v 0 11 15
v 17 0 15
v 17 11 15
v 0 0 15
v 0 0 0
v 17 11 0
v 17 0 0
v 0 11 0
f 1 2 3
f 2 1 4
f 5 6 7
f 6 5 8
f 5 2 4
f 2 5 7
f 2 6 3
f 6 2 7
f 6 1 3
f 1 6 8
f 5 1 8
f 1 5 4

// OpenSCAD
// Generated by SolidPython 1.0.1 on 2020-07-29 00:46:56


cube(size = [17, 11, 15]);
/***********************************************
*********      SolidPython code:      **********
************************************************
 
# import packages: SolidPython
from solid import *
from solid.utils import *
from itertools import chain, combinations, permutations


class Resize:

    def __init__(self, scad_file):
        self.scad_file = scad_file
        #self.scad_file = import_scad(scad_file)
        # cone/cylinder param:
        self.r1 = 0
        self.r2 = 0
        self.h = 0
        # rectangular prism param:
        self.w = 0
        self.l = 0
        # ellipse param:
        self.r = 0

    # import OpenScad code (file name corresponds to shape)


    # classify shape + parameters
    def assign(self, param1, param2, param3):
        if self.scad_file == 'cone.scad':
            self.r1 = param1
            self.r2 = param2
            self.h = param3
        elif self.scad_file == 'cylinder.scad':
            self.r1 = param1
            self.r2 = param2
            self.h = param3
        elif self.scad_file == 'rectangularPrism.scad':
            self.h = param1
            self.l = param2
            self.w = param3
        else:
            self.r = param1
            self.h = param2

    # resize parameters
    def iterate(self):
        x = range(3, 20, 2)
        i = 1
        if self.scad_file == 'cone.scad':
            tempList = list(permutations(x, 2))
            for temp in tempList:
                param1 = temp[0]
                param2 = temp[1]
                filepath = 'produced_scad_files/' + 'cone' + str(param1) + '_' + str(param2) + '_' + '.scad'
                scad_render_to_file(cylinder(h=param1, r1=param2, r2=0), filepath)

        elif self.scad_file == 'cylinder.scad':
            tempList = list(permutations(x, 3))
            for temp in tempList:
                param1 = temp[0]
                param2 = temp[1]
                filepath = 'produced_scad_files/' + 'cylinder' + str(param1) + '_' + str(param2) + '_' + '.scad'
                scad_render_to_file(cylinder(h=param1, r1=param2, r2=param2), filepath)

        elif self.scad_file == 'rectangularPrism.scad':
            tempList = list(permutations(x, 3))
            for temp in tempList:
                param1 = temp[0]
                param2 = temp[1]
                param3 = temp[2]
                filepath = 'produced_scad_files/' + 'rectangularPrism' + str(param1) + '_' + str(param2) + '_' + str(
                    param3) + '.scad'
                scad_render_to_file(cube(size=(param1, param2, param3)), filepath)

        elif self.scad_file == 'ellipse.scad':
            tempList = list(permutations(x, 4))
            for temp in tempList:
                param1 = temp[0]
                param2 = temp[1]
                param3 = temp[2]
                param4 = temp[3]
                filepath = 'produced_scad_files/' + 'ellipse' + str(param1) + '_' + str(param2) + '_' + str(param3) + '_' + str(param4) + '.scad'
                scad_render_to_file(scale([param1, param2, param3])(sphere(r=param4)), filepath)

    def render_to_scadfile(self):
        scad_render_to_file(scad, 'example.scad') 
 
************************************************/
